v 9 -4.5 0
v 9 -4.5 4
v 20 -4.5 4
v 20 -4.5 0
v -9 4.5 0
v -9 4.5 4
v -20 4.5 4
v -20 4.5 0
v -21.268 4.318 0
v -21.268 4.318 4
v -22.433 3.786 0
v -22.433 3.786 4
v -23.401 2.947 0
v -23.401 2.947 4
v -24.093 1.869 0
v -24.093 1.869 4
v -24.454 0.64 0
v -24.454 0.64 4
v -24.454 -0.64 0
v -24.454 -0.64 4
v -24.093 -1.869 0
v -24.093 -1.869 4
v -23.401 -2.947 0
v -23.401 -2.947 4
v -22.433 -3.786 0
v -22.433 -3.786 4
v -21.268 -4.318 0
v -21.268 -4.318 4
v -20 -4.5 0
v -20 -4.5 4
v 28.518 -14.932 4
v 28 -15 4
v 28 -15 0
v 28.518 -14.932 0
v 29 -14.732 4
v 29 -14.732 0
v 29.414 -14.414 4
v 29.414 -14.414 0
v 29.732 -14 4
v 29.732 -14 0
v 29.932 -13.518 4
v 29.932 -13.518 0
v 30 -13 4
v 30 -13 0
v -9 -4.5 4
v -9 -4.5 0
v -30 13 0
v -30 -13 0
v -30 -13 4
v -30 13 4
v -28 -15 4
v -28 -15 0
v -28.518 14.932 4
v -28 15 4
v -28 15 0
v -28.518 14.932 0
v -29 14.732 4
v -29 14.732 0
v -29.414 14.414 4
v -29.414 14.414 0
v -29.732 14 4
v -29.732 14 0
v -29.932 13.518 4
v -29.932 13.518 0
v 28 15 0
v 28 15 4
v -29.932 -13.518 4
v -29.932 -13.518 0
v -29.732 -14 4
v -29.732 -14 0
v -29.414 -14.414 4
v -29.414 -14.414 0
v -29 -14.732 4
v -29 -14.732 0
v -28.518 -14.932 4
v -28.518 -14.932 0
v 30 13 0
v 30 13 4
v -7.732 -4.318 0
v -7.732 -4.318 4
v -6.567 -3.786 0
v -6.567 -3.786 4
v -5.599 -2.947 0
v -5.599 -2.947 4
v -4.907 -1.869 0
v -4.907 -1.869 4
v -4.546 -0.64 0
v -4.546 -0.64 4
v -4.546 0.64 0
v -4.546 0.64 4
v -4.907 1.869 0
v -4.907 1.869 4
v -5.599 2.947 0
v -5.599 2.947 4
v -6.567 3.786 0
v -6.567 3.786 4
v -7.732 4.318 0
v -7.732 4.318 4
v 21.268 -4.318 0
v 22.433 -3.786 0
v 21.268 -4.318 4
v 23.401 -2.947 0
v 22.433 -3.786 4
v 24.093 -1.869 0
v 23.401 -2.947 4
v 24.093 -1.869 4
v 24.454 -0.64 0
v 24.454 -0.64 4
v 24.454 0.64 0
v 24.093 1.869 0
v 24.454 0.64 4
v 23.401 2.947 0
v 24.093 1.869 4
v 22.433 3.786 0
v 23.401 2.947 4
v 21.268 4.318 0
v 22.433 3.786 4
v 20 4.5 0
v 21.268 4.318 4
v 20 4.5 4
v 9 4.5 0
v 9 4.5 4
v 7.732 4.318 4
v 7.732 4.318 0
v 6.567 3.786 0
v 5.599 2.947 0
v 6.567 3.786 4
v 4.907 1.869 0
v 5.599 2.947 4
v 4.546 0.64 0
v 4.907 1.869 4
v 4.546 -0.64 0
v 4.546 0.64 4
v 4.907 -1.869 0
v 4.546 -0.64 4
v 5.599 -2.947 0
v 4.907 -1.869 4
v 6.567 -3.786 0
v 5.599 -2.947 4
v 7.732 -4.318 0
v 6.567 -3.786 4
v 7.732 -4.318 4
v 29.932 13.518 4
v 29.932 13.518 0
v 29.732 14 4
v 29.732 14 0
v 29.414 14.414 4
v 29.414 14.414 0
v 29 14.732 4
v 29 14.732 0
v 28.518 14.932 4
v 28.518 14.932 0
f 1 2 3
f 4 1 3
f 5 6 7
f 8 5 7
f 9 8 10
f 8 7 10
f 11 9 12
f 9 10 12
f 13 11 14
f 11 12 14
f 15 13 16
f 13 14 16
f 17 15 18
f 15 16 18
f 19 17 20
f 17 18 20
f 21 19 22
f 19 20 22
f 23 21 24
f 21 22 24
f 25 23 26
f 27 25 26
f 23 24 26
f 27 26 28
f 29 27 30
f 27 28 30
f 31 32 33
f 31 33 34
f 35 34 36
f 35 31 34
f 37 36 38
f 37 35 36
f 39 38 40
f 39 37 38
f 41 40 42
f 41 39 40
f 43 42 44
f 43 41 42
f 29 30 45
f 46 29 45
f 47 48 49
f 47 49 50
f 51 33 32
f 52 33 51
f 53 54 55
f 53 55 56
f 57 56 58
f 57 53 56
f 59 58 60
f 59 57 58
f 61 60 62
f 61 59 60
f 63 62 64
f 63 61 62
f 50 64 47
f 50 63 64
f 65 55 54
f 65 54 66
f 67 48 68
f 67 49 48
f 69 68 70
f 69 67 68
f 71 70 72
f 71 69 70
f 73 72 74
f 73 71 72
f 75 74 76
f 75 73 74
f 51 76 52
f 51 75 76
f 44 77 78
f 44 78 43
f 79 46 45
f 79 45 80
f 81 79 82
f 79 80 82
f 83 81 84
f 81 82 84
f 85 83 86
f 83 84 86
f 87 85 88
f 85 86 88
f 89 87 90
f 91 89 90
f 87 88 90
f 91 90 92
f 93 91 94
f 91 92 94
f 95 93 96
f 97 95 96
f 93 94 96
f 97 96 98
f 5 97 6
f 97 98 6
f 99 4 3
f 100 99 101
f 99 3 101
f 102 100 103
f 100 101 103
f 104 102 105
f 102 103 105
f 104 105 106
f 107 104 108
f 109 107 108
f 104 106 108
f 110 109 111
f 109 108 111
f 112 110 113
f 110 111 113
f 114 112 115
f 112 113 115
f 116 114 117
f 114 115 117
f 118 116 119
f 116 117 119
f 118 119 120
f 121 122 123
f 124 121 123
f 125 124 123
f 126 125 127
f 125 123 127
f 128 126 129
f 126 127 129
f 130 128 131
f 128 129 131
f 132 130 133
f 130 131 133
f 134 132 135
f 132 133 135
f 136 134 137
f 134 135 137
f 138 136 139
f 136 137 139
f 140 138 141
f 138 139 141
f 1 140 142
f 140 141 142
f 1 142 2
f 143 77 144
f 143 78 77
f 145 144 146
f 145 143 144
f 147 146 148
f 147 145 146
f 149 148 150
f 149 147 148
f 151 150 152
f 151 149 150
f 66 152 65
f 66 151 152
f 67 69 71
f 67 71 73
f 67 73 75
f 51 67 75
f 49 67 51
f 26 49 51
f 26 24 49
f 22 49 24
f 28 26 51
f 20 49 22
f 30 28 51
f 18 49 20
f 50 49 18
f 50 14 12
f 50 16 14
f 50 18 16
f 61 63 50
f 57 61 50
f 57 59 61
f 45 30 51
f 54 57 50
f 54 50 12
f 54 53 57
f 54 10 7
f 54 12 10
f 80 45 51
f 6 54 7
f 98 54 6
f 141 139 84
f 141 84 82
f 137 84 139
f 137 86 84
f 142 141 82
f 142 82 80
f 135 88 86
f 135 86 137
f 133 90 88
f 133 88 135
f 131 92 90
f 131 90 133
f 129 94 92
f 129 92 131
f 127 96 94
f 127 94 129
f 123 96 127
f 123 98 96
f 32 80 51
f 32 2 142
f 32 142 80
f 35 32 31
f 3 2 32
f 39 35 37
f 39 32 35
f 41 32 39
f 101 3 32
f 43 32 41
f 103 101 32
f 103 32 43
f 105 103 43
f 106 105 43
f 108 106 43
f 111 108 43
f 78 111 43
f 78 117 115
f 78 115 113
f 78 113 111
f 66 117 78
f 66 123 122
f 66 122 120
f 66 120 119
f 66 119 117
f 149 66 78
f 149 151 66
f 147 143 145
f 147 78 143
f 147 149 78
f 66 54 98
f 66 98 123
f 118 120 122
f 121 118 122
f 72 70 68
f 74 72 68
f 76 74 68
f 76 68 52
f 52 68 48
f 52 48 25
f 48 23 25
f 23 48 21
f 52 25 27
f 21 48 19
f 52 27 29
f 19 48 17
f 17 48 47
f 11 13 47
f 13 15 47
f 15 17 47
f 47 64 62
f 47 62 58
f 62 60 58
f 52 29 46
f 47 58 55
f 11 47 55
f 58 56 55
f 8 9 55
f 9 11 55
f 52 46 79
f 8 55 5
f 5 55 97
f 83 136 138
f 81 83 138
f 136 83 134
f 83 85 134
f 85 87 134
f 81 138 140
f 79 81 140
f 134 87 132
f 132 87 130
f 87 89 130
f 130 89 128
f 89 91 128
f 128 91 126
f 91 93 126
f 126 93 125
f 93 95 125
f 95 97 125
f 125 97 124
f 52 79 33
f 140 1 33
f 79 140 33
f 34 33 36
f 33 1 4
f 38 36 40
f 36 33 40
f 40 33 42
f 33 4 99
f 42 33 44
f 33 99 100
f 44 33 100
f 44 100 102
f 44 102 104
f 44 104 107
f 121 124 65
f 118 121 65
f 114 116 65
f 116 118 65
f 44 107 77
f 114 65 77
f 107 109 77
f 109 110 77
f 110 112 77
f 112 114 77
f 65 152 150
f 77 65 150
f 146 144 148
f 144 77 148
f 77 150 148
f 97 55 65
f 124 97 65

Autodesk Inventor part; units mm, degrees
ref_plane "YZ Plane" through (0, 0, 0) normal (1, 0, 0) x (0, 1, 0)
ref_plane "XZ Plane" through (0, 0, 0) normal (0, 1, 0) x (-1, 0, 0)
ref_plane "XY Plane" through (0, 0, 0) normal (0, 0, 1) x (1, 0, 0)
sketch "Náčrt1" plane through (0, 0, 0) normal (0, 0, 1) x (1, 0, 0)
  line L0 (-42, 0) -> (42, 0) projected
  line L1 (0, -21) -> (0, 21) projected
  line L2 (30, -15) -> (-30, -15)
  line L3 (-30, -15) -> (-30, 15)
  line L4 (-30, 15) -> (30, 15)
  line L5 (30, 15) -> (30, -15)
  point P0 (0, 0)
  dimension "d0" = 60
  dimension "d1" = 30
extrude "Vysunutí1" add sketch "Náčrt1" along normal blind 4
sketch "Náčrt2" plane through (0, 0, 4) normal (0, 0, 1) x (1, 0, 0)
  line L0 (30, 15) -> (-30, 15) projected
  line L1 (-30, 15) -> (-30, -15) projected
  line L2 (-30, -15) -> (30, -15) projected
  line L3 (30, -15) -> (30, 15) projected
  line L4 (-42, 0) -> (42, 0) projected
  line L5 (0, -21) -> (0, 21) projected
  line L6 (-20, 0) -> (-9, 0) construction
  line L7 (-20, -4.5) -> (-9, -4.5)
  line L8 (-9, 4.5) -> (-20, 4.5)
  arc A0 (-20, 4.5) -> (-20, -4.5) centre (-20, 0) ccw
  arc A1 (-9, -4.5) -> (-9, 4.5) centre (-9, 0) ccw
  point P0 (0, 0)
  point P1 (-14.5, 0)
  dimension "d4" = 9
  dimension "d5" = 11
  dimension "d6" = 10
extrude "Vysunutí2" cut sketch "Náčrt2" against normal through all contours A1 L7 A0 L4 | L4 A0 L8 A1
mirror "Zrcadlit1" about plane through (0, 0, 0) normal (1, 0, 0) of "Vysunutí2"
fillet "Zaoblení1" radius 2 4 edges at (-30, 15, 2) (30, 15, 2) (30, -15, 2) (-30, -15, 2)
properties part number "connector_30x30"
